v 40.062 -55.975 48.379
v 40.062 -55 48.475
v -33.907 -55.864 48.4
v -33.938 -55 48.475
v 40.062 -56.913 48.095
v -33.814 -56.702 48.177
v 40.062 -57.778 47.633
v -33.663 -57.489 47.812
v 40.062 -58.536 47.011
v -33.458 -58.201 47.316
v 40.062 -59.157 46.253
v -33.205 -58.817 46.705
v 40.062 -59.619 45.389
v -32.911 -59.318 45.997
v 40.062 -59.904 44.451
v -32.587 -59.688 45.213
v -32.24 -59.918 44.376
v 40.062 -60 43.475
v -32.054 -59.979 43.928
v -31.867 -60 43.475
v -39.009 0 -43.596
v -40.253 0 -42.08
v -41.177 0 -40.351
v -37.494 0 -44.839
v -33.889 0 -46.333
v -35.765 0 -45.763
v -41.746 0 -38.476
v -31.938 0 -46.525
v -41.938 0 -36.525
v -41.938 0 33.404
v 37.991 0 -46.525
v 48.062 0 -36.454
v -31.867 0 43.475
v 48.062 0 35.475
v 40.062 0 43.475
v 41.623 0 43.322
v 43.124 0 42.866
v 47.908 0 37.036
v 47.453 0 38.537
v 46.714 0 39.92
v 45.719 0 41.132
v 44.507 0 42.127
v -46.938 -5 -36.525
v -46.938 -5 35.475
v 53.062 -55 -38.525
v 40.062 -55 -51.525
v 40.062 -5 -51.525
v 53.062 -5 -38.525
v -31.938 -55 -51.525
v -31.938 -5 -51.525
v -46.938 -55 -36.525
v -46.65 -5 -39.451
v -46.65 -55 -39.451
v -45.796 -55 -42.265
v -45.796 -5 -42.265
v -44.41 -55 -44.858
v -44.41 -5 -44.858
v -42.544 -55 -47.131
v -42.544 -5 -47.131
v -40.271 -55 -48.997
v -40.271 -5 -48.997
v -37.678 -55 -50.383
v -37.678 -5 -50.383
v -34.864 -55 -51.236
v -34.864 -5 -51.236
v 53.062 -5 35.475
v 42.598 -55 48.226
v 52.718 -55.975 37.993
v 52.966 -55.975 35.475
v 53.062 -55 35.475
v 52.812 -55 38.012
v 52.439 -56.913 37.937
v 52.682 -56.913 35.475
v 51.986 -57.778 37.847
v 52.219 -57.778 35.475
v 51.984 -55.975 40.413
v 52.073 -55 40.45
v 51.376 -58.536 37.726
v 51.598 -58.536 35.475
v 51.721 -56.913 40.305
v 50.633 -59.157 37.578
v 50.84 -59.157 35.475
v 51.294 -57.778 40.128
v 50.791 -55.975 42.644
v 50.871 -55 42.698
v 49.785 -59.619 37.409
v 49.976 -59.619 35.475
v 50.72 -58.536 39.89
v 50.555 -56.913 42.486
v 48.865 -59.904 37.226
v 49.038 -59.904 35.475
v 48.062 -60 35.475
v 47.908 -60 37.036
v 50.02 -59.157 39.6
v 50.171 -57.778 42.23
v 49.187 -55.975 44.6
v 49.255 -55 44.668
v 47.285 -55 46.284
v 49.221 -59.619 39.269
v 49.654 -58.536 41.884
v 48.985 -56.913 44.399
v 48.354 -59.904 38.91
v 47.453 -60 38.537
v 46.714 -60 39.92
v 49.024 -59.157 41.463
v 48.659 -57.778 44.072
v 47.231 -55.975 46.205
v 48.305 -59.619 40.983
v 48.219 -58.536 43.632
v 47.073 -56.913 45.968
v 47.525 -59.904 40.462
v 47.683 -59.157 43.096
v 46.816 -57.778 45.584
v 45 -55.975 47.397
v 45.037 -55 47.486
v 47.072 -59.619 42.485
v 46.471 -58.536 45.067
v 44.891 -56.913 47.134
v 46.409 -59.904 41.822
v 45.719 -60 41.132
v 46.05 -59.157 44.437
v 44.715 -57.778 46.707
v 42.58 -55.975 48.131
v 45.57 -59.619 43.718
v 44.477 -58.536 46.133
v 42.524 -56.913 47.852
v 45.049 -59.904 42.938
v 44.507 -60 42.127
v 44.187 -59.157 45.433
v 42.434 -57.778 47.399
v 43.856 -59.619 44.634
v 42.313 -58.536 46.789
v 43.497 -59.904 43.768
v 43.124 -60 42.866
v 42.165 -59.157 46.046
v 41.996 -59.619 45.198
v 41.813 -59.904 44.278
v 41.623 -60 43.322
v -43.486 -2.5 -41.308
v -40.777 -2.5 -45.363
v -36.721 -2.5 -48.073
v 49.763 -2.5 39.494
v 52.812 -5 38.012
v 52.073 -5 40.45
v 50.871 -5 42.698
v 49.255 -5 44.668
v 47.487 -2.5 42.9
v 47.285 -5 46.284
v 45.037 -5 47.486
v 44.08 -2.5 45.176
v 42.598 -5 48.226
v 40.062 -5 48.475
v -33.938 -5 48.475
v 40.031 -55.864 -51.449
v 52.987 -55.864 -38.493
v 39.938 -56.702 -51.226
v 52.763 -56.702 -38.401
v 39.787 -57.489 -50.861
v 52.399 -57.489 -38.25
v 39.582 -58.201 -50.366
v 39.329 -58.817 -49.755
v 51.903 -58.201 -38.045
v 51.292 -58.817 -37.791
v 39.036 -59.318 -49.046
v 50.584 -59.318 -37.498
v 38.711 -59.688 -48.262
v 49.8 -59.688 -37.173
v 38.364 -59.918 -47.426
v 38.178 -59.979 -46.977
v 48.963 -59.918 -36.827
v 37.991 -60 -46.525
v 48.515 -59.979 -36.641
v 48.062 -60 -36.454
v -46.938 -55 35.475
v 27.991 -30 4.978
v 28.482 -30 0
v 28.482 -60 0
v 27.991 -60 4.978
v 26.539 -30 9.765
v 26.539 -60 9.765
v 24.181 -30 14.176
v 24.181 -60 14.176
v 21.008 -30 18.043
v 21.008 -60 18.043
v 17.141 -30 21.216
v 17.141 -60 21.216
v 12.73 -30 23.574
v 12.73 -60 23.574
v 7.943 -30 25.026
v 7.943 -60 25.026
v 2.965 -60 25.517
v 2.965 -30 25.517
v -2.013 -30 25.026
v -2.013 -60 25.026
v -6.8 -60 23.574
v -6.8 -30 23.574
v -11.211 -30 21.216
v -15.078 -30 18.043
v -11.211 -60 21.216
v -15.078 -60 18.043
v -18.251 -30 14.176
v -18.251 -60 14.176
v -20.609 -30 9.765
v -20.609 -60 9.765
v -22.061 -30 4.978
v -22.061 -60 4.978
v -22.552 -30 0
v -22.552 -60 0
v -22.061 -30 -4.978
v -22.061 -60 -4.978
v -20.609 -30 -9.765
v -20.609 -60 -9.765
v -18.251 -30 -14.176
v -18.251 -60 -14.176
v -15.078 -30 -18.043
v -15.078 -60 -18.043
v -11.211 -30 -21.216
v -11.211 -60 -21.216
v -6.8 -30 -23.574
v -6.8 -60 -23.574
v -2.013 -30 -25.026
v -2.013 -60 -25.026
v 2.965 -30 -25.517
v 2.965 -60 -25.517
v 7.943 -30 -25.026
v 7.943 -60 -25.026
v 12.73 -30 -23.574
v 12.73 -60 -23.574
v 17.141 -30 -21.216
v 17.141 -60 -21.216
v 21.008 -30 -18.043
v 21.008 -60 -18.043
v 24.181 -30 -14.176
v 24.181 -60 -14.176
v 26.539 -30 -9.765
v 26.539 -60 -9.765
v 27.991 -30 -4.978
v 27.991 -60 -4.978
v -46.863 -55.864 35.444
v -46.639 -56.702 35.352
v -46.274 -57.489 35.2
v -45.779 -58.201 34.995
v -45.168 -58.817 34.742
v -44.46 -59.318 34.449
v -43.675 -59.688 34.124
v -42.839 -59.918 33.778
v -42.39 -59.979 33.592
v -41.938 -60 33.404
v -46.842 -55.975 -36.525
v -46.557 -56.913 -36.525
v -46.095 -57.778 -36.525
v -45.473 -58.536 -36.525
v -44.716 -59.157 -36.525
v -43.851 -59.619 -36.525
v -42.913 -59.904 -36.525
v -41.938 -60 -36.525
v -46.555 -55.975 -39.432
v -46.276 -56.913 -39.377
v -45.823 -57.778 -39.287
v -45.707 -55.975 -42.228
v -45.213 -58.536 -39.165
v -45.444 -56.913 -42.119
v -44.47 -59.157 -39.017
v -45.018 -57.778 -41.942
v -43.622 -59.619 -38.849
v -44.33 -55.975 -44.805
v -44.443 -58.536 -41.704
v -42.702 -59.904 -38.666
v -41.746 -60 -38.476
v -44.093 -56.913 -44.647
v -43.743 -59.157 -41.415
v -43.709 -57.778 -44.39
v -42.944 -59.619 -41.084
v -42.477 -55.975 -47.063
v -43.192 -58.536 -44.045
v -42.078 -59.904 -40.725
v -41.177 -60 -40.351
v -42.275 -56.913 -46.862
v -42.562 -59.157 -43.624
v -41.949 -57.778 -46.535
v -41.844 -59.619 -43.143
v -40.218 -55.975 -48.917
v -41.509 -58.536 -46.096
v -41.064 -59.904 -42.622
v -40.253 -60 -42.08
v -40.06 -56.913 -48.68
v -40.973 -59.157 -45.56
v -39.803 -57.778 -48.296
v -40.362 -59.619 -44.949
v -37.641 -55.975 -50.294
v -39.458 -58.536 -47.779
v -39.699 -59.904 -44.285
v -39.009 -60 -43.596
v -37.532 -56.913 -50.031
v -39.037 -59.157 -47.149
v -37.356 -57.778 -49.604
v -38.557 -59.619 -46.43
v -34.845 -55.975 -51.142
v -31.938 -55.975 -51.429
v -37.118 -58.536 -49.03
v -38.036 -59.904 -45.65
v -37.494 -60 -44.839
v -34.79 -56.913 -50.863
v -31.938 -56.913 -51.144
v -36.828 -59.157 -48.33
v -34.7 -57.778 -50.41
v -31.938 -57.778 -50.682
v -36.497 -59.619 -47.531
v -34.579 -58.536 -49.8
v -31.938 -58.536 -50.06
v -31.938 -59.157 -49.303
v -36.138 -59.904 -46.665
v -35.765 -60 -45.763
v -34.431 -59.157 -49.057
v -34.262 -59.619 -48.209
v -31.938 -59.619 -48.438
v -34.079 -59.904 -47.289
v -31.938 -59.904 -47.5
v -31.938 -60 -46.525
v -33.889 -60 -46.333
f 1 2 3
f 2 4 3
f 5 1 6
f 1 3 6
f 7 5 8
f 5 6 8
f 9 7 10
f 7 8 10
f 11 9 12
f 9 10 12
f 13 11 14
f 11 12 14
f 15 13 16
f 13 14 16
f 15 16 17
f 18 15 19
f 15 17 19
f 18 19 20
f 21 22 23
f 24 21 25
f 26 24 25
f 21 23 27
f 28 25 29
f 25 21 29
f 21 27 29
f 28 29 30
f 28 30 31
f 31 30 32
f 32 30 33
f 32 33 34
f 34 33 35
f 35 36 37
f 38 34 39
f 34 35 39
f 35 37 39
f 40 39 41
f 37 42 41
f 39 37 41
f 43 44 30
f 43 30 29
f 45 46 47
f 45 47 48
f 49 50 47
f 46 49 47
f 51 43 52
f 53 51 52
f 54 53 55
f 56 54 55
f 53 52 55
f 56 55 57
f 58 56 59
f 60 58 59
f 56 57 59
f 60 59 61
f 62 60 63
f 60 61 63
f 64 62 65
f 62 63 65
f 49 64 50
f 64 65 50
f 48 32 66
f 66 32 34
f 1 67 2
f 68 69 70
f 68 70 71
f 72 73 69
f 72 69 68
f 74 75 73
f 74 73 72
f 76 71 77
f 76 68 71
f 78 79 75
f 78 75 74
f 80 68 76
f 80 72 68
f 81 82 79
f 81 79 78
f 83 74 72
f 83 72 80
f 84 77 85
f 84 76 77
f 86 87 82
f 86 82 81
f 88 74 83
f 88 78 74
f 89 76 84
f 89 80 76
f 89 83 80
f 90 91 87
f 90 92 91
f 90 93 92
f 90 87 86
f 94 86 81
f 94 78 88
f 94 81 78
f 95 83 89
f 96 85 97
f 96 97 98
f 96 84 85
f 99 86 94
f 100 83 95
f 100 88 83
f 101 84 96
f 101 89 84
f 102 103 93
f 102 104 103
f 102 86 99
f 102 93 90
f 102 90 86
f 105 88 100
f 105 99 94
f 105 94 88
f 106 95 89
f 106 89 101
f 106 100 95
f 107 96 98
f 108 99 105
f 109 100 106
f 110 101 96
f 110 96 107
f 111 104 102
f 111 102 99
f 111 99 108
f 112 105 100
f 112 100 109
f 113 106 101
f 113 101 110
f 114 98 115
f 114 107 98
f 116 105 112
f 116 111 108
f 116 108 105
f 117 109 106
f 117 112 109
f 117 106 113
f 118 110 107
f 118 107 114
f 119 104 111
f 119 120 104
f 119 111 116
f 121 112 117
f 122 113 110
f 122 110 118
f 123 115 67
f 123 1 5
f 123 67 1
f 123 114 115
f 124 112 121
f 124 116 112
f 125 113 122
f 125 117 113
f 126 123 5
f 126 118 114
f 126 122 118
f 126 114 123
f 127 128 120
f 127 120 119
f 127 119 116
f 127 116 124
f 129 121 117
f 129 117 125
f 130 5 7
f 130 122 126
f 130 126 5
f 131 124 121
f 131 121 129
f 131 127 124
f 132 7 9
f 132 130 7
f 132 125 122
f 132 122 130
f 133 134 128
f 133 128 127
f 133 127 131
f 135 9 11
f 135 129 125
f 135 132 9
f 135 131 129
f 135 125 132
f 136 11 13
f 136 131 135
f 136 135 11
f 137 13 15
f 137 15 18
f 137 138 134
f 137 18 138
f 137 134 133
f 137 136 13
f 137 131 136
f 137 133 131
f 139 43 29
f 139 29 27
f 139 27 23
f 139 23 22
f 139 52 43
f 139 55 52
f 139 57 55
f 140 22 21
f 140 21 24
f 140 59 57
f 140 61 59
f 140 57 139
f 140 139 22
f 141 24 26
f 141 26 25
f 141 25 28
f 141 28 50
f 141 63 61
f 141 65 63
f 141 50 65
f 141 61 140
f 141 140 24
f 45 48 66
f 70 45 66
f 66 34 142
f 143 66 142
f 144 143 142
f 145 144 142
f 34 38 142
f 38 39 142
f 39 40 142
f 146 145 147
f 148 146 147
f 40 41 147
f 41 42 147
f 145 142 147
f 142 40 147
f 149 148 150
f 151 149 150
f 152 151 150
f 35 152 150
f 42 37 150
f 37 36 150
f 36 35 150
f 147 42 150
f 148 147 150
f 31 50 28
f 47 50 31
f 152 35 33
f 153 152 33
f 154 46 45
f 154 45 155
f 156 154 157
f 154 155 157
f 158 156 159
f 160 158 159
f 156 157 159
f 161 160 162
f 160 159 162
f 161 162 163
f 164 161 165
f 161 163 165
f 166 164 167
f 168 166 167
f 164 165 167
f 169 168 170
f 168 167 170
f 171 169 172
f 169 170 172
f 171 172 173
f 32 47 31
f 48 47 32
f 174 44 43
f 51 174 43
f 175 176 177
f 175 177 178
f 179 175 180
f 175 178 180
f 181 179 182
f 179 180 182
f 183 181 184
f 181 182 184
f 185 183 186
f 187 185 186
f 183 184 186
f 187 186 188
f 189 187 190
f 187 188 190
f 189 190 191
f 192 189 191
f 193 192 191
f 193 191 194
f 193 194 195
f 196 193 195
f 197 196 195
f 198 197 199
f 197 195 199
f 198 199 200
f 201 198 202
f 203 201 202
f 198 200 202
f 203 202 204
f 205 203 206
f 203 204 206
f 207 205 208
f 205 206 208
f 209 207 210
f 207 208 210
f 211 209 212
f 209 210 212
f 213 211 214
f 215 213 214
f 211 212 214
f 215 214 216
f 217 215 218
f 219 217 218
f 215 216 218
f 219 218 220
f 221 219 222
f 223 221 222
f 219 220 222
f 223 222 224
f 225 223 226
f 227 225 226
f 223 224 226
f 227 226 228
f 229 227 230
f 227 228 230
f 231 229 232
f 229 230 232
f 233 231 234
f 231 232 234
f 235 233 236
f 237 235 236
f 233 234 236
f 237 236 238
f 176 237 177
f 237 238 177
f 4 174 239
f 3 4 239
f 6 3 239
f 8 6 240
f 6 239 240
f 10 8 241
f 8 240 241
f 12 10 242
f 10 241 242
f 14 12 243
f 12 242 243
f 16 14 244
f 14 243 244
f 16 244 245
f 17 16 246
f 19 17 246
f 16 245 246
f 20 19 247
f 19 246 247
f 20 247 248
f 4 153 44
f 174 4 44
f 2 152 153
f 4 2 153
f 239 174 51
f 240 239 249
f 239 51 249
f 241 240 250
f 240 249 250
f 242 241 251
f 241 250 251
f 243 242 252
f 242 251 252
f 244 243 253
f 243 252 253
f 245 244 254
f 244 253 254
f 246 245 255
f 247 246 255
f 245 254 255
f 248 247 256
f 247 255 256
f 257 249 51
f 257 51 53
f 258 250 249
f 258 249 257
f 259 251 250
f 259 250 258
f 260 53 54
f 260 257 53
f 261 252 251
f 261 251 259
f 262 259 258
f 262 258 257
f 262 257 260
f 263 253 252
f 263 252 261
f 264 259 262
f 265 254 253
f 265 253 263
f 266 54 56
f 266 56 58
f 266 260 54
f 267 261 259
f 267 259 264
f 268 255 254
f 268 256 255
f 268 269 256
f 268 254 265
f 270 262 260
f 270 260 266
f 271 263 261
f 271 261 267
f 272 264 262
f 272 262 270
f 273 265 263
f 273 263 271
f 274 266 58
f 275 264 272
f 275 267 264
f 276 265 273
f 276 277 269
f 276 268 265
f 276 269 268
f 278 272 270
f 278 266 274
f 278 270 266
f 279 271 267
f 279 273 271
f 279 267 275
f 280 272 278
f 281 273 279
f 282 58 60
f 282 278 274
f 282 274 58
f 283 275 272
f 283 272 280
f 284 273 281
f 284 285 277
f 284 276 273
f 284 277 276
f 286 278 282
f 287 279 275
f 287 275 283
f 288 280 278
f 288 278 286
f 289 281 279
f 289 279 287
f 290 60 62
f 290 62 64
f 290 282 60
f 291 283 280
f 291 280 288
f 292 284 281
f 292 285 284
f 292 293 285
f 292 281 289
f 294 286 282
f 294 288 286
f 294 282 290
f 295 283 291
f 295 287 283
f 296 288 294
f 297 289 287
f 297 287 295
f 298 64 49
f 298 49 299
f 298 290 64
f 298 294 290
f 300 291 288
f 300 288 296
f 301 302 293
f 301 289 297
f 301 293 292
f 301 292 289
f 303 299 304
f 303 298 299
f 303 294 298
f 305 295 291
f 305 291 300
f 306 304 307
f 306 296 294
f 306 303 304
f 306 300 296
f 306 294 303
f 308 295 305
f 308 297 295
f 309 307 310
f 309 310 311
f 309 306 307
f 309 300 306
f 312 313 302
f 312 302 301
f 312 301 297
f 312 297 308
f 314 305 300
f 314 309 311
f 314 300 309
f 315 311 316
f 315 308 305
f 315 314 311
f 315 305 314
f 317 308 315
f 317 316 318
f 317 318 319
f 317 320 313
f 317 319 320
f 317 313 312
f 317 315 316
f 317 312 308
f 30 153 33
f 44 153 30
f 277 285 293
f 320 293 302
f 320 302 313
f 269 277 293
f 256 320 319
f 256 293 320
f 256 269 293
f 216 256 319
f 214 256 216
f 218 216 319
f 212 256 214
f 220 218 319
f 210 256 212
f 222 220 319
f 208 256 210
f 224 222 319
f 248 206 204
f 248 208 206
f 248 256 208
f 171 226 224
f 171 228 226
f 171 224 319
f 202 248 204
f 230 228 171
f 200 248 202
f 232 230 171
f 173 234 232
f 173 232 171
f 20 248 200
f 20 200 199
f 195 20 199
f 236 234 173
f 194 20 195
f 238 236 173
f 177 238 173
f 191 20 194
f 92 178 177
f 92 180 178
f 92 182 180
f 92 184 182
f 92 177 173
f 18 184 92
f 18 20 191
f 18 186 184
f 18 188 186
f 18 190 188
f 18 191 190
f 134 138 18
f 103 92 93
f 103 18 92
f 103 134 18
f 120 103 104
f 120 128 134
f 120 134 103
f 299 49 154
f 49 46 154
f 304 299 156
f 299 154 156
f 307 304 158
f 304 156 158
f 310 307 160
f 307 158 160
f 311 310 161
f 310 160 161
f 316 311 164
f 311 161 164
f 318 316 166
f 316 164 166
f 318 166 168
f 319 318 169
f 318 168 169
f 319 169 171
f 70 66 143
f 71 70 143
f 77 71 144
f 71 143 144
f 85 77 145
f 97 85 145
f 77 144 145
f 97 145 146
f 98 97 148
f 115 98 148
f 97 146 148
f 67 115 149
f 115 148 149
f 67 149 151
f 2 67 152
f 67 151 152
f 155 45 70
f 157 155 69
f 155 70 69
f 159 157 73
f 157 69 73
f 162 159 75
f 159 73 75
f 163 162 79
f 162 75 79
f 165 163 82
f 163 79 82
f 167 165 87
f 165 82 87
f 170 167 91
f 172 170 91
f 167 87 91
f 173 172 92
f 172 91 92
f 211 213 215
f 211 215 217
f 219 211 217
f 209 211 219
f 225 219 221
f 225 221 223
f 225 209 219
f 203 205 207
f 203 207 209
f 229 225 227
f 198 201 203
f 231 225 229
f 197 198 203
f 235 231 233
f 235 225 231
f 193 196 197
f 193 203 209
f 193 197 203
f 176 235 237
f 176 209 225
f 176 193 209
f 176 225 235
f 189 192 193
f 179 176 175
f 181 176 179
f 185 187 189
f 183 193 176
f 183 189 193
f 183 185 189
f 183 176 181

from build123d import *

# Parameters (mm, degrees)
F1_DEPTH = 60
F2_R     = 5
F3_SIZE  = 5
F4_R     = 25.516517
F5_DEPTH = 30


with BuildPart() as f1:
    # F0 (on Front) → F1 (new body)
    with BuildSketch(Plane.XZ):
        with BuildLine():
            Line((40.062132, 48.475344), (-33.937868, 48.475344))
            Line((-33.937868, 48.475344), (-46.937868, 35.475344))
            Line((-46.937868, 35.475344), (-46.937868, -36.524656))
            ThreePointArc((-46.937868, -36.524656), (-42.544469, -47.131258), (-31.937868, -51.524656))
            Line((-31.937868, -51.524656), (40.062132, -51.524656))
            Line((40.062132, -51.524656), (53.062132, -38.524656))
            Line((53.062132, -38.524656), (53.062132, 35.475344))
            ThreePointArc((53.062132, 35.475344), (49.25452, 44.667732), (40.062132, 48.475344))
        make_face()
    extrude(amount=F1_DEPTH)

    # F2
    f2_edges = [f1.edges().sort_by_distance(p)[0] for p in [
        (3.062132, -60, 48.475344),
        (-40.437868, -60, 41.975344),
        (-46.937868, -60, -0.524656),
        (-42.544469, -60, -47.131258),
        (4.062132, -60, -51.524656),
        (46.562132, -60, -45.024656),
        (53.062132, -60, -1.524656),
        (49.25452, -60, 44.667732),
    ]]
    fillet(f2_edges, radius=F2_R)

    # F3
    f3_edges = [f1.edges().sort_by_distance(p)[0] for p in [
        (3.062132, 0, 48.475344),
        (-40.437868, 0, 41.975344),
        (-46.937868, 0, -0.524656),
        (-42.544469, 0, -47.131258),
        (4.062132, 0, -51.524656),
        (46.562132, 0, -45.024656),
        (53.062132, 0, -1.524656),
        (49.25452, 0, 44.667732),
    ]]
    chamfer(f3_edges, length=F3_SIZE)

    # F4 (on face) → F5 (cut)
    with BuildSketch(Plane.XZ.offset(60)):
        with Locations((2.964985, 0)):
            Circle(F4_R)
    extrude(amount=-F5_DEPTH, mode=Mode.SUBTRACT)


solid = f1.part
